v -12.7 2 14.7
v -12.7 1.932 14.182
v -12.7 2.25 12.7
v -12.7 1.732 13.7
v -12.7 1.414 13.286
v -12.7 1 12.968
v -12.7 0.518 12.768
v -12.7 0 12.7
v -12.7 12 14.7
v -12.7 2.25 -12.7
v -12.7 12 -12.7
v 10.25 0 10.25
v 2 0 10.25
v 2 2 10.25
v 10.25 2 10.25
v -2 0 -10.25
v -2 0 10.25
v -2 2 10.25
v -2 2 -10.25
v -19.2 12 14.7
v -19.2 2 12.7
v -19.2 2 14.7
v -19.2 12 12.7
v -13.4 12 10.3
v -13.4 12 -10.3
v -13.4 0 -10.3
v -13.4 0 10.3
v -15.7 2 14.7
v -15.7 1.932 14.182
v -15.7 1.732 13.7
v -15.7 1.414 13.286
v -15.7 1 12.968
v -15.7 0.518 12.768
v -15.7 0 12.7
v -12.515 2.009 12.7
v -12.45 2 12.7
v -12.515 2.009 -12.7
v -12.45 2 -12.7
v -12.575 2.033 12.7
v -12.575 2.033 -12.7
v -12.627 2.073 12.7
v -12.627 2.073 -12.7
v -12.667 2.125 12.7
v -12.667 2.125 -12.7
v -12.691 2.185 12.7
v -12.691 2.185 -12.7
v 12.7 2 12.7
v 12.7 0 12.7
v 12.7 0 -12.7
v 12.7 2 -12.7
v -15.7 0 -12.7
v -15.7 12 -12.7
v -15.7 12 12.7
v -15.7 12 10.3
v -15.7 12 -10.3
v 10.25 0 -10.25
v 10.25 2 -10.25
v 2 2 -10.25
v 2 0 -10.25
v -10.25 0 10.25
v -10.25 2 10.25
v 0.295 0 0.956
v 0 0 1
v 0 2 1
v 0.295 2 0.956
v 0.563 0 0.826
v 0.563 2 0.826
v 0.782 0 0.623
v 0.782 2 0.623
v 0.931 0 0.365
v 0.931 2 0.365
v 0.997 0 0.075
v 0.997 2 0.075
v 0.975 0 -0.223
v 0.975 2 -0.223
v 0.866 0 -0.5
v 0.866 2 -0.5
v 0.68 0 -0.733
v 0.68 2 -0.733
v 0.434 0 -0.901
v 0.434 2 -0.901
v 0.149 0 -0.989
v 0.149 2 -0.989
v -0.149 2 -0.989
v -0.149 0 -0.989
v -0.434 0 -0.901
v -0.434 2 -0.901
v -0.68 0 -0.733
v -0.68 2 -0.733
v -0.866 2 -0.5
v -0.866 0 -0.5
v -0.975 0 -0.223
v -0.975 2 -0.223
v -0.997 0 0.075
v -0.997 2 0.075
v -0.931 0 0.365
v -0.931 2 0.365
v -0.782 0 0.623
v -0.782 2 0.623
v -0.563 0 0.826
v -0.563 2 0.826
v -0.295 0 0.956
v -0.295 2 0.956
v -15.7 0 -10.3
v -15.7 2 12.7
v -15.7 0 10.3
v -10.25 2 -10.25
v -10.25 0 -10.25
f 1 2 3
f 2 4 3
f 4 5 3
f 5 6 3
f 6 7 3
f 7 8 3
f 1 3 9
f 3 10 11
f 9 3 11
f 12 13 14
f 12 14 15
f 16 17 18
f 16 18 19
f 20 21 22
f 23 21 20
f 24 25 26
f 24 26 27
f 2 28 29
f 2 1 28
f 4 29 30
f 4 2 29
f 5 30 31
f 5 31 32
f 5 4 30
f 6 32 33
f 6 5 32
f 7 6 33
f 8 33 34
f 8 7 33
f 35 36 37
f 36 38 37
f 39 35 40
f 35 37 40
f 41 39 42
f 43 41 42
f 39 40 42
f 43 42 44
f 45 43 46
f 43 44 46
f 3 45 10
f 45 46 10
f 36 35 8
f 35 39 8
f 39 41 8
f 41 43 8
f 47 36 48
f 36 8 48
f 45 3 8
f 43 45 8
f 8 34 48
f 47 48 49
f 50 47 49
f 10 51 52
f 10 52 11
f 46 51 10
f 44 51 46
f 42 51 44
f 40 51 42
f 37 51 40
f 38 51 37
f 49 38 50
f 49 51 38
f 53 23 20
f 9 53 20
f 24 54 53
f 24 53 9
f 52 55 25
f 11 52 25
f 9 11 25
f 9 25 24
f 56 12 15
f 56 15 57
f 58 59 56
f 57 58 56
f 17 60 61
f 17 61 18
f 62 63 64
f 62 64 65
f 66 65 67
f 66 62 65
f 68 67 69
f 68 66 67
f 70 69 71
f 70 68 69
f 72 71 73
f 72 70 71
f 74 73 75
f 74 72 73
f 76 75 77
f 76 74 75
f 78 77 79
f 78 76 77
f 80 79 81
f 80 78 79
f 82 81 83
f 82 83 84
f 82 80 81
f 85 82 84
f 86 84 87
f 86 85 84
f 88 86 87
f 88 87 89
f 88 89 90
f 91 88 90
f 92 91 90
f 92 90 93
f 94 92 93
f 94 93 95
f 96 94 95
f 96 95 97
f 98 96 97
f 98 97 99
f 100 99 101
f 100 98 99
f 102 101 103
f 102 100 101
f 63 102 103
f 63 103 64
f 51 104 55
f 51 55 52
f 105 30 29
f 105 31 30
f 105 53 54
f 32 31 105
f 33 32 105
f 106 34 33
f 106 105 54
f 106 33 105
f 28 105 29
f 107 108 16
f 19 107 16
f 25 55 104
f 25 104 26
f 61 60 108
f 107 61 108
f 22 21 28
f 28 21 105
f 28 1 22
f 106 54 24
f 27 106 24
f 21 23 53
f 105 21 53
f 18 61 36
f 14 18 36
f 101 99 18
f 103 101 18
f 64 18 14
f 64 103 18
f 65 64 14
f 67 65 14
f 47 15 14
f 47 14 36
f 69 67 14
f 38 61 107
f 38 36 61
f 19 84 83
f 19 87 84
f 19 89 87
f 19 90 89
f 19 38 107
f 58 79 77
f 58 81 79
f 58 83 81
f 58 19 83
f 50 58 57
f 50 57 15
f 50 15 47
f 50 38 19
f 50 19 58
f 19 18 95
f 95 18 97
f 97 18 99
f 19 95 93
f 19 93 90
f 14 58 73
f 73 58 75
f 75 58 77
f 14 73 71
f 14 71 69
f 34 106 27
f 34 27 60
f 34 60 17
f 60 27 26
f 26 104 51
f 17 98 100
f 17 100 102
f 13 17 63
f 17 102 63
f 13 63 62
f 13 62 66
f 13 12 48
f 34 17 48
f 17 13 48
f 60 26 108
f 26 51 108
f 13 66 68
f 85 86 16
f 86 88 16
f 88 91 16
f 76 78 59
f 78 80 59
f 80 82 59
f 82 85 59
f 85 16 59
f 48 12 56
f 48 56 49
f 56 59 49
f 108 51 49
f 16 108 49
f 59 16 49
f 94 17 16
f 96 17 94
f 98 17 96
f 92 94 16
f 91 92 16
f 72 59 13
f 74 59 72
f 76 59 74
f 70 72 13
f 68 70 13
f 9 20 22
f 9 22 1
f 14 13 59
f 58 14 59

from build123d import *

# Parameters (mm, degrees)
SKETCH2_R               = 1
SKETCH2_W               = 8.25
SKETCH2_H               = 20.5
BOSS_EXTRUDE1_DEPTH     = 2
SKETCH3_W               = 3
SKETCH3_H               = 25.4
BOSS_EXTRUDE2_DEPTH     = 10
FILLET1_R               = 0.25
SKETCH5_W               = 6.5
SKETCH5_H               = 10
BOSS_EXTRUDE3_DEPTH     = 2
CUT_EXTRUDE1_DEPTH      = 27.994999537
CUT_EXTRUDE1_DEPTH_BACK = 27.994999537
SKETCH6_W               = 2.6
SKETCH6_H               = 20.6
FILLET3_R               = 2


with BuildPart() as part:
    # Sketch2 → Boss-Extrude1 (new body)
    with BuildSketch(Plane(origin=(0, 0, 0), x_dir=(1, 0, 0), z_dir=(0, 1, 0))):
        Polygon((-12.7, 12.7), (-15.7, 12.7), (-15.7, -12.7), (-12.7, -12.7), (12.7, -12.7), (12.7, 12.7), align=None)
        with Locations(Location((0, 0, 0), (0, 0, 270))):
            Circle(SKETCH2_R, mode=Mode.SUBTRACT)
        with Locations((6.125, 0)):
            Rectangle(SKETCH2_W, SKETCH2_H, mode=Mode.SUBTRACT)
        with Locations((-6.125, 0)):
            Rectangle(SKETCH2_W, SKETCH2_H, mode=Mode.SUBTRACT)
    extrude(amount=BOSS_EXTRUDE1_DEPTH)

    # Sketch3 → Boss-Extrude2 (add)
    with BuildSketch(Plane(origin=(0, 2, 0), x_dir=(1, 0, 0), z_dir=(0, 1, 0))):
        with Locations((-14.2, 0)):
            Rectangle(SKETCH3_W, SKETCH3_H)
    extrude(amount=BOSS_EXTRUDE2_DEPTH)

    # Fillet1
    fillet1_edges = [part.edges().sort_by_distance(p)[0] for p in [
        (-12.7, 2, 0),
    ]]
    fillet(fillet1_edges, radius=FILLET1_R)

    # Sketch5 → Boss-Extrude3 (add)
    with BuildSketch(Plane.XY.offset(12.7)):
        with Locations((-15.95, 7)):
            Rectangle(SKETCH5_W, SKETCH5_H)
    extrude(amount=BOSS_EXTRUDE3_DEPTH)

    # Sketch6 → Cut-Extrude1 (cut, two sides: drawn at the far end of the back side and taken through both)
    with BuildSketch(Plane.XZ.offset(-CUT_EXTRUDE1_DEPTH_BACK)):
        with Locations((-14.7, 0)):
            Rectangle(SKETCH6_W, SKETCH6_H)
    extrude(amount=CUT_EXTRUDE1_DEPTH + CUT_EXTRUDE1_DEPTH_BACK, mode=Mode.SUBTRACT)

    # Fillet3
    fillet3_edges = [part.edges().sort_by_distance(p)[0] for p in [
        (-14.2, 2, 12.7),
    ]]
    fillet(fillet3_edges, radius=FILLET3_R - 0.0001)  # a hair under: the kernel refuses the full size


solid = part.part
